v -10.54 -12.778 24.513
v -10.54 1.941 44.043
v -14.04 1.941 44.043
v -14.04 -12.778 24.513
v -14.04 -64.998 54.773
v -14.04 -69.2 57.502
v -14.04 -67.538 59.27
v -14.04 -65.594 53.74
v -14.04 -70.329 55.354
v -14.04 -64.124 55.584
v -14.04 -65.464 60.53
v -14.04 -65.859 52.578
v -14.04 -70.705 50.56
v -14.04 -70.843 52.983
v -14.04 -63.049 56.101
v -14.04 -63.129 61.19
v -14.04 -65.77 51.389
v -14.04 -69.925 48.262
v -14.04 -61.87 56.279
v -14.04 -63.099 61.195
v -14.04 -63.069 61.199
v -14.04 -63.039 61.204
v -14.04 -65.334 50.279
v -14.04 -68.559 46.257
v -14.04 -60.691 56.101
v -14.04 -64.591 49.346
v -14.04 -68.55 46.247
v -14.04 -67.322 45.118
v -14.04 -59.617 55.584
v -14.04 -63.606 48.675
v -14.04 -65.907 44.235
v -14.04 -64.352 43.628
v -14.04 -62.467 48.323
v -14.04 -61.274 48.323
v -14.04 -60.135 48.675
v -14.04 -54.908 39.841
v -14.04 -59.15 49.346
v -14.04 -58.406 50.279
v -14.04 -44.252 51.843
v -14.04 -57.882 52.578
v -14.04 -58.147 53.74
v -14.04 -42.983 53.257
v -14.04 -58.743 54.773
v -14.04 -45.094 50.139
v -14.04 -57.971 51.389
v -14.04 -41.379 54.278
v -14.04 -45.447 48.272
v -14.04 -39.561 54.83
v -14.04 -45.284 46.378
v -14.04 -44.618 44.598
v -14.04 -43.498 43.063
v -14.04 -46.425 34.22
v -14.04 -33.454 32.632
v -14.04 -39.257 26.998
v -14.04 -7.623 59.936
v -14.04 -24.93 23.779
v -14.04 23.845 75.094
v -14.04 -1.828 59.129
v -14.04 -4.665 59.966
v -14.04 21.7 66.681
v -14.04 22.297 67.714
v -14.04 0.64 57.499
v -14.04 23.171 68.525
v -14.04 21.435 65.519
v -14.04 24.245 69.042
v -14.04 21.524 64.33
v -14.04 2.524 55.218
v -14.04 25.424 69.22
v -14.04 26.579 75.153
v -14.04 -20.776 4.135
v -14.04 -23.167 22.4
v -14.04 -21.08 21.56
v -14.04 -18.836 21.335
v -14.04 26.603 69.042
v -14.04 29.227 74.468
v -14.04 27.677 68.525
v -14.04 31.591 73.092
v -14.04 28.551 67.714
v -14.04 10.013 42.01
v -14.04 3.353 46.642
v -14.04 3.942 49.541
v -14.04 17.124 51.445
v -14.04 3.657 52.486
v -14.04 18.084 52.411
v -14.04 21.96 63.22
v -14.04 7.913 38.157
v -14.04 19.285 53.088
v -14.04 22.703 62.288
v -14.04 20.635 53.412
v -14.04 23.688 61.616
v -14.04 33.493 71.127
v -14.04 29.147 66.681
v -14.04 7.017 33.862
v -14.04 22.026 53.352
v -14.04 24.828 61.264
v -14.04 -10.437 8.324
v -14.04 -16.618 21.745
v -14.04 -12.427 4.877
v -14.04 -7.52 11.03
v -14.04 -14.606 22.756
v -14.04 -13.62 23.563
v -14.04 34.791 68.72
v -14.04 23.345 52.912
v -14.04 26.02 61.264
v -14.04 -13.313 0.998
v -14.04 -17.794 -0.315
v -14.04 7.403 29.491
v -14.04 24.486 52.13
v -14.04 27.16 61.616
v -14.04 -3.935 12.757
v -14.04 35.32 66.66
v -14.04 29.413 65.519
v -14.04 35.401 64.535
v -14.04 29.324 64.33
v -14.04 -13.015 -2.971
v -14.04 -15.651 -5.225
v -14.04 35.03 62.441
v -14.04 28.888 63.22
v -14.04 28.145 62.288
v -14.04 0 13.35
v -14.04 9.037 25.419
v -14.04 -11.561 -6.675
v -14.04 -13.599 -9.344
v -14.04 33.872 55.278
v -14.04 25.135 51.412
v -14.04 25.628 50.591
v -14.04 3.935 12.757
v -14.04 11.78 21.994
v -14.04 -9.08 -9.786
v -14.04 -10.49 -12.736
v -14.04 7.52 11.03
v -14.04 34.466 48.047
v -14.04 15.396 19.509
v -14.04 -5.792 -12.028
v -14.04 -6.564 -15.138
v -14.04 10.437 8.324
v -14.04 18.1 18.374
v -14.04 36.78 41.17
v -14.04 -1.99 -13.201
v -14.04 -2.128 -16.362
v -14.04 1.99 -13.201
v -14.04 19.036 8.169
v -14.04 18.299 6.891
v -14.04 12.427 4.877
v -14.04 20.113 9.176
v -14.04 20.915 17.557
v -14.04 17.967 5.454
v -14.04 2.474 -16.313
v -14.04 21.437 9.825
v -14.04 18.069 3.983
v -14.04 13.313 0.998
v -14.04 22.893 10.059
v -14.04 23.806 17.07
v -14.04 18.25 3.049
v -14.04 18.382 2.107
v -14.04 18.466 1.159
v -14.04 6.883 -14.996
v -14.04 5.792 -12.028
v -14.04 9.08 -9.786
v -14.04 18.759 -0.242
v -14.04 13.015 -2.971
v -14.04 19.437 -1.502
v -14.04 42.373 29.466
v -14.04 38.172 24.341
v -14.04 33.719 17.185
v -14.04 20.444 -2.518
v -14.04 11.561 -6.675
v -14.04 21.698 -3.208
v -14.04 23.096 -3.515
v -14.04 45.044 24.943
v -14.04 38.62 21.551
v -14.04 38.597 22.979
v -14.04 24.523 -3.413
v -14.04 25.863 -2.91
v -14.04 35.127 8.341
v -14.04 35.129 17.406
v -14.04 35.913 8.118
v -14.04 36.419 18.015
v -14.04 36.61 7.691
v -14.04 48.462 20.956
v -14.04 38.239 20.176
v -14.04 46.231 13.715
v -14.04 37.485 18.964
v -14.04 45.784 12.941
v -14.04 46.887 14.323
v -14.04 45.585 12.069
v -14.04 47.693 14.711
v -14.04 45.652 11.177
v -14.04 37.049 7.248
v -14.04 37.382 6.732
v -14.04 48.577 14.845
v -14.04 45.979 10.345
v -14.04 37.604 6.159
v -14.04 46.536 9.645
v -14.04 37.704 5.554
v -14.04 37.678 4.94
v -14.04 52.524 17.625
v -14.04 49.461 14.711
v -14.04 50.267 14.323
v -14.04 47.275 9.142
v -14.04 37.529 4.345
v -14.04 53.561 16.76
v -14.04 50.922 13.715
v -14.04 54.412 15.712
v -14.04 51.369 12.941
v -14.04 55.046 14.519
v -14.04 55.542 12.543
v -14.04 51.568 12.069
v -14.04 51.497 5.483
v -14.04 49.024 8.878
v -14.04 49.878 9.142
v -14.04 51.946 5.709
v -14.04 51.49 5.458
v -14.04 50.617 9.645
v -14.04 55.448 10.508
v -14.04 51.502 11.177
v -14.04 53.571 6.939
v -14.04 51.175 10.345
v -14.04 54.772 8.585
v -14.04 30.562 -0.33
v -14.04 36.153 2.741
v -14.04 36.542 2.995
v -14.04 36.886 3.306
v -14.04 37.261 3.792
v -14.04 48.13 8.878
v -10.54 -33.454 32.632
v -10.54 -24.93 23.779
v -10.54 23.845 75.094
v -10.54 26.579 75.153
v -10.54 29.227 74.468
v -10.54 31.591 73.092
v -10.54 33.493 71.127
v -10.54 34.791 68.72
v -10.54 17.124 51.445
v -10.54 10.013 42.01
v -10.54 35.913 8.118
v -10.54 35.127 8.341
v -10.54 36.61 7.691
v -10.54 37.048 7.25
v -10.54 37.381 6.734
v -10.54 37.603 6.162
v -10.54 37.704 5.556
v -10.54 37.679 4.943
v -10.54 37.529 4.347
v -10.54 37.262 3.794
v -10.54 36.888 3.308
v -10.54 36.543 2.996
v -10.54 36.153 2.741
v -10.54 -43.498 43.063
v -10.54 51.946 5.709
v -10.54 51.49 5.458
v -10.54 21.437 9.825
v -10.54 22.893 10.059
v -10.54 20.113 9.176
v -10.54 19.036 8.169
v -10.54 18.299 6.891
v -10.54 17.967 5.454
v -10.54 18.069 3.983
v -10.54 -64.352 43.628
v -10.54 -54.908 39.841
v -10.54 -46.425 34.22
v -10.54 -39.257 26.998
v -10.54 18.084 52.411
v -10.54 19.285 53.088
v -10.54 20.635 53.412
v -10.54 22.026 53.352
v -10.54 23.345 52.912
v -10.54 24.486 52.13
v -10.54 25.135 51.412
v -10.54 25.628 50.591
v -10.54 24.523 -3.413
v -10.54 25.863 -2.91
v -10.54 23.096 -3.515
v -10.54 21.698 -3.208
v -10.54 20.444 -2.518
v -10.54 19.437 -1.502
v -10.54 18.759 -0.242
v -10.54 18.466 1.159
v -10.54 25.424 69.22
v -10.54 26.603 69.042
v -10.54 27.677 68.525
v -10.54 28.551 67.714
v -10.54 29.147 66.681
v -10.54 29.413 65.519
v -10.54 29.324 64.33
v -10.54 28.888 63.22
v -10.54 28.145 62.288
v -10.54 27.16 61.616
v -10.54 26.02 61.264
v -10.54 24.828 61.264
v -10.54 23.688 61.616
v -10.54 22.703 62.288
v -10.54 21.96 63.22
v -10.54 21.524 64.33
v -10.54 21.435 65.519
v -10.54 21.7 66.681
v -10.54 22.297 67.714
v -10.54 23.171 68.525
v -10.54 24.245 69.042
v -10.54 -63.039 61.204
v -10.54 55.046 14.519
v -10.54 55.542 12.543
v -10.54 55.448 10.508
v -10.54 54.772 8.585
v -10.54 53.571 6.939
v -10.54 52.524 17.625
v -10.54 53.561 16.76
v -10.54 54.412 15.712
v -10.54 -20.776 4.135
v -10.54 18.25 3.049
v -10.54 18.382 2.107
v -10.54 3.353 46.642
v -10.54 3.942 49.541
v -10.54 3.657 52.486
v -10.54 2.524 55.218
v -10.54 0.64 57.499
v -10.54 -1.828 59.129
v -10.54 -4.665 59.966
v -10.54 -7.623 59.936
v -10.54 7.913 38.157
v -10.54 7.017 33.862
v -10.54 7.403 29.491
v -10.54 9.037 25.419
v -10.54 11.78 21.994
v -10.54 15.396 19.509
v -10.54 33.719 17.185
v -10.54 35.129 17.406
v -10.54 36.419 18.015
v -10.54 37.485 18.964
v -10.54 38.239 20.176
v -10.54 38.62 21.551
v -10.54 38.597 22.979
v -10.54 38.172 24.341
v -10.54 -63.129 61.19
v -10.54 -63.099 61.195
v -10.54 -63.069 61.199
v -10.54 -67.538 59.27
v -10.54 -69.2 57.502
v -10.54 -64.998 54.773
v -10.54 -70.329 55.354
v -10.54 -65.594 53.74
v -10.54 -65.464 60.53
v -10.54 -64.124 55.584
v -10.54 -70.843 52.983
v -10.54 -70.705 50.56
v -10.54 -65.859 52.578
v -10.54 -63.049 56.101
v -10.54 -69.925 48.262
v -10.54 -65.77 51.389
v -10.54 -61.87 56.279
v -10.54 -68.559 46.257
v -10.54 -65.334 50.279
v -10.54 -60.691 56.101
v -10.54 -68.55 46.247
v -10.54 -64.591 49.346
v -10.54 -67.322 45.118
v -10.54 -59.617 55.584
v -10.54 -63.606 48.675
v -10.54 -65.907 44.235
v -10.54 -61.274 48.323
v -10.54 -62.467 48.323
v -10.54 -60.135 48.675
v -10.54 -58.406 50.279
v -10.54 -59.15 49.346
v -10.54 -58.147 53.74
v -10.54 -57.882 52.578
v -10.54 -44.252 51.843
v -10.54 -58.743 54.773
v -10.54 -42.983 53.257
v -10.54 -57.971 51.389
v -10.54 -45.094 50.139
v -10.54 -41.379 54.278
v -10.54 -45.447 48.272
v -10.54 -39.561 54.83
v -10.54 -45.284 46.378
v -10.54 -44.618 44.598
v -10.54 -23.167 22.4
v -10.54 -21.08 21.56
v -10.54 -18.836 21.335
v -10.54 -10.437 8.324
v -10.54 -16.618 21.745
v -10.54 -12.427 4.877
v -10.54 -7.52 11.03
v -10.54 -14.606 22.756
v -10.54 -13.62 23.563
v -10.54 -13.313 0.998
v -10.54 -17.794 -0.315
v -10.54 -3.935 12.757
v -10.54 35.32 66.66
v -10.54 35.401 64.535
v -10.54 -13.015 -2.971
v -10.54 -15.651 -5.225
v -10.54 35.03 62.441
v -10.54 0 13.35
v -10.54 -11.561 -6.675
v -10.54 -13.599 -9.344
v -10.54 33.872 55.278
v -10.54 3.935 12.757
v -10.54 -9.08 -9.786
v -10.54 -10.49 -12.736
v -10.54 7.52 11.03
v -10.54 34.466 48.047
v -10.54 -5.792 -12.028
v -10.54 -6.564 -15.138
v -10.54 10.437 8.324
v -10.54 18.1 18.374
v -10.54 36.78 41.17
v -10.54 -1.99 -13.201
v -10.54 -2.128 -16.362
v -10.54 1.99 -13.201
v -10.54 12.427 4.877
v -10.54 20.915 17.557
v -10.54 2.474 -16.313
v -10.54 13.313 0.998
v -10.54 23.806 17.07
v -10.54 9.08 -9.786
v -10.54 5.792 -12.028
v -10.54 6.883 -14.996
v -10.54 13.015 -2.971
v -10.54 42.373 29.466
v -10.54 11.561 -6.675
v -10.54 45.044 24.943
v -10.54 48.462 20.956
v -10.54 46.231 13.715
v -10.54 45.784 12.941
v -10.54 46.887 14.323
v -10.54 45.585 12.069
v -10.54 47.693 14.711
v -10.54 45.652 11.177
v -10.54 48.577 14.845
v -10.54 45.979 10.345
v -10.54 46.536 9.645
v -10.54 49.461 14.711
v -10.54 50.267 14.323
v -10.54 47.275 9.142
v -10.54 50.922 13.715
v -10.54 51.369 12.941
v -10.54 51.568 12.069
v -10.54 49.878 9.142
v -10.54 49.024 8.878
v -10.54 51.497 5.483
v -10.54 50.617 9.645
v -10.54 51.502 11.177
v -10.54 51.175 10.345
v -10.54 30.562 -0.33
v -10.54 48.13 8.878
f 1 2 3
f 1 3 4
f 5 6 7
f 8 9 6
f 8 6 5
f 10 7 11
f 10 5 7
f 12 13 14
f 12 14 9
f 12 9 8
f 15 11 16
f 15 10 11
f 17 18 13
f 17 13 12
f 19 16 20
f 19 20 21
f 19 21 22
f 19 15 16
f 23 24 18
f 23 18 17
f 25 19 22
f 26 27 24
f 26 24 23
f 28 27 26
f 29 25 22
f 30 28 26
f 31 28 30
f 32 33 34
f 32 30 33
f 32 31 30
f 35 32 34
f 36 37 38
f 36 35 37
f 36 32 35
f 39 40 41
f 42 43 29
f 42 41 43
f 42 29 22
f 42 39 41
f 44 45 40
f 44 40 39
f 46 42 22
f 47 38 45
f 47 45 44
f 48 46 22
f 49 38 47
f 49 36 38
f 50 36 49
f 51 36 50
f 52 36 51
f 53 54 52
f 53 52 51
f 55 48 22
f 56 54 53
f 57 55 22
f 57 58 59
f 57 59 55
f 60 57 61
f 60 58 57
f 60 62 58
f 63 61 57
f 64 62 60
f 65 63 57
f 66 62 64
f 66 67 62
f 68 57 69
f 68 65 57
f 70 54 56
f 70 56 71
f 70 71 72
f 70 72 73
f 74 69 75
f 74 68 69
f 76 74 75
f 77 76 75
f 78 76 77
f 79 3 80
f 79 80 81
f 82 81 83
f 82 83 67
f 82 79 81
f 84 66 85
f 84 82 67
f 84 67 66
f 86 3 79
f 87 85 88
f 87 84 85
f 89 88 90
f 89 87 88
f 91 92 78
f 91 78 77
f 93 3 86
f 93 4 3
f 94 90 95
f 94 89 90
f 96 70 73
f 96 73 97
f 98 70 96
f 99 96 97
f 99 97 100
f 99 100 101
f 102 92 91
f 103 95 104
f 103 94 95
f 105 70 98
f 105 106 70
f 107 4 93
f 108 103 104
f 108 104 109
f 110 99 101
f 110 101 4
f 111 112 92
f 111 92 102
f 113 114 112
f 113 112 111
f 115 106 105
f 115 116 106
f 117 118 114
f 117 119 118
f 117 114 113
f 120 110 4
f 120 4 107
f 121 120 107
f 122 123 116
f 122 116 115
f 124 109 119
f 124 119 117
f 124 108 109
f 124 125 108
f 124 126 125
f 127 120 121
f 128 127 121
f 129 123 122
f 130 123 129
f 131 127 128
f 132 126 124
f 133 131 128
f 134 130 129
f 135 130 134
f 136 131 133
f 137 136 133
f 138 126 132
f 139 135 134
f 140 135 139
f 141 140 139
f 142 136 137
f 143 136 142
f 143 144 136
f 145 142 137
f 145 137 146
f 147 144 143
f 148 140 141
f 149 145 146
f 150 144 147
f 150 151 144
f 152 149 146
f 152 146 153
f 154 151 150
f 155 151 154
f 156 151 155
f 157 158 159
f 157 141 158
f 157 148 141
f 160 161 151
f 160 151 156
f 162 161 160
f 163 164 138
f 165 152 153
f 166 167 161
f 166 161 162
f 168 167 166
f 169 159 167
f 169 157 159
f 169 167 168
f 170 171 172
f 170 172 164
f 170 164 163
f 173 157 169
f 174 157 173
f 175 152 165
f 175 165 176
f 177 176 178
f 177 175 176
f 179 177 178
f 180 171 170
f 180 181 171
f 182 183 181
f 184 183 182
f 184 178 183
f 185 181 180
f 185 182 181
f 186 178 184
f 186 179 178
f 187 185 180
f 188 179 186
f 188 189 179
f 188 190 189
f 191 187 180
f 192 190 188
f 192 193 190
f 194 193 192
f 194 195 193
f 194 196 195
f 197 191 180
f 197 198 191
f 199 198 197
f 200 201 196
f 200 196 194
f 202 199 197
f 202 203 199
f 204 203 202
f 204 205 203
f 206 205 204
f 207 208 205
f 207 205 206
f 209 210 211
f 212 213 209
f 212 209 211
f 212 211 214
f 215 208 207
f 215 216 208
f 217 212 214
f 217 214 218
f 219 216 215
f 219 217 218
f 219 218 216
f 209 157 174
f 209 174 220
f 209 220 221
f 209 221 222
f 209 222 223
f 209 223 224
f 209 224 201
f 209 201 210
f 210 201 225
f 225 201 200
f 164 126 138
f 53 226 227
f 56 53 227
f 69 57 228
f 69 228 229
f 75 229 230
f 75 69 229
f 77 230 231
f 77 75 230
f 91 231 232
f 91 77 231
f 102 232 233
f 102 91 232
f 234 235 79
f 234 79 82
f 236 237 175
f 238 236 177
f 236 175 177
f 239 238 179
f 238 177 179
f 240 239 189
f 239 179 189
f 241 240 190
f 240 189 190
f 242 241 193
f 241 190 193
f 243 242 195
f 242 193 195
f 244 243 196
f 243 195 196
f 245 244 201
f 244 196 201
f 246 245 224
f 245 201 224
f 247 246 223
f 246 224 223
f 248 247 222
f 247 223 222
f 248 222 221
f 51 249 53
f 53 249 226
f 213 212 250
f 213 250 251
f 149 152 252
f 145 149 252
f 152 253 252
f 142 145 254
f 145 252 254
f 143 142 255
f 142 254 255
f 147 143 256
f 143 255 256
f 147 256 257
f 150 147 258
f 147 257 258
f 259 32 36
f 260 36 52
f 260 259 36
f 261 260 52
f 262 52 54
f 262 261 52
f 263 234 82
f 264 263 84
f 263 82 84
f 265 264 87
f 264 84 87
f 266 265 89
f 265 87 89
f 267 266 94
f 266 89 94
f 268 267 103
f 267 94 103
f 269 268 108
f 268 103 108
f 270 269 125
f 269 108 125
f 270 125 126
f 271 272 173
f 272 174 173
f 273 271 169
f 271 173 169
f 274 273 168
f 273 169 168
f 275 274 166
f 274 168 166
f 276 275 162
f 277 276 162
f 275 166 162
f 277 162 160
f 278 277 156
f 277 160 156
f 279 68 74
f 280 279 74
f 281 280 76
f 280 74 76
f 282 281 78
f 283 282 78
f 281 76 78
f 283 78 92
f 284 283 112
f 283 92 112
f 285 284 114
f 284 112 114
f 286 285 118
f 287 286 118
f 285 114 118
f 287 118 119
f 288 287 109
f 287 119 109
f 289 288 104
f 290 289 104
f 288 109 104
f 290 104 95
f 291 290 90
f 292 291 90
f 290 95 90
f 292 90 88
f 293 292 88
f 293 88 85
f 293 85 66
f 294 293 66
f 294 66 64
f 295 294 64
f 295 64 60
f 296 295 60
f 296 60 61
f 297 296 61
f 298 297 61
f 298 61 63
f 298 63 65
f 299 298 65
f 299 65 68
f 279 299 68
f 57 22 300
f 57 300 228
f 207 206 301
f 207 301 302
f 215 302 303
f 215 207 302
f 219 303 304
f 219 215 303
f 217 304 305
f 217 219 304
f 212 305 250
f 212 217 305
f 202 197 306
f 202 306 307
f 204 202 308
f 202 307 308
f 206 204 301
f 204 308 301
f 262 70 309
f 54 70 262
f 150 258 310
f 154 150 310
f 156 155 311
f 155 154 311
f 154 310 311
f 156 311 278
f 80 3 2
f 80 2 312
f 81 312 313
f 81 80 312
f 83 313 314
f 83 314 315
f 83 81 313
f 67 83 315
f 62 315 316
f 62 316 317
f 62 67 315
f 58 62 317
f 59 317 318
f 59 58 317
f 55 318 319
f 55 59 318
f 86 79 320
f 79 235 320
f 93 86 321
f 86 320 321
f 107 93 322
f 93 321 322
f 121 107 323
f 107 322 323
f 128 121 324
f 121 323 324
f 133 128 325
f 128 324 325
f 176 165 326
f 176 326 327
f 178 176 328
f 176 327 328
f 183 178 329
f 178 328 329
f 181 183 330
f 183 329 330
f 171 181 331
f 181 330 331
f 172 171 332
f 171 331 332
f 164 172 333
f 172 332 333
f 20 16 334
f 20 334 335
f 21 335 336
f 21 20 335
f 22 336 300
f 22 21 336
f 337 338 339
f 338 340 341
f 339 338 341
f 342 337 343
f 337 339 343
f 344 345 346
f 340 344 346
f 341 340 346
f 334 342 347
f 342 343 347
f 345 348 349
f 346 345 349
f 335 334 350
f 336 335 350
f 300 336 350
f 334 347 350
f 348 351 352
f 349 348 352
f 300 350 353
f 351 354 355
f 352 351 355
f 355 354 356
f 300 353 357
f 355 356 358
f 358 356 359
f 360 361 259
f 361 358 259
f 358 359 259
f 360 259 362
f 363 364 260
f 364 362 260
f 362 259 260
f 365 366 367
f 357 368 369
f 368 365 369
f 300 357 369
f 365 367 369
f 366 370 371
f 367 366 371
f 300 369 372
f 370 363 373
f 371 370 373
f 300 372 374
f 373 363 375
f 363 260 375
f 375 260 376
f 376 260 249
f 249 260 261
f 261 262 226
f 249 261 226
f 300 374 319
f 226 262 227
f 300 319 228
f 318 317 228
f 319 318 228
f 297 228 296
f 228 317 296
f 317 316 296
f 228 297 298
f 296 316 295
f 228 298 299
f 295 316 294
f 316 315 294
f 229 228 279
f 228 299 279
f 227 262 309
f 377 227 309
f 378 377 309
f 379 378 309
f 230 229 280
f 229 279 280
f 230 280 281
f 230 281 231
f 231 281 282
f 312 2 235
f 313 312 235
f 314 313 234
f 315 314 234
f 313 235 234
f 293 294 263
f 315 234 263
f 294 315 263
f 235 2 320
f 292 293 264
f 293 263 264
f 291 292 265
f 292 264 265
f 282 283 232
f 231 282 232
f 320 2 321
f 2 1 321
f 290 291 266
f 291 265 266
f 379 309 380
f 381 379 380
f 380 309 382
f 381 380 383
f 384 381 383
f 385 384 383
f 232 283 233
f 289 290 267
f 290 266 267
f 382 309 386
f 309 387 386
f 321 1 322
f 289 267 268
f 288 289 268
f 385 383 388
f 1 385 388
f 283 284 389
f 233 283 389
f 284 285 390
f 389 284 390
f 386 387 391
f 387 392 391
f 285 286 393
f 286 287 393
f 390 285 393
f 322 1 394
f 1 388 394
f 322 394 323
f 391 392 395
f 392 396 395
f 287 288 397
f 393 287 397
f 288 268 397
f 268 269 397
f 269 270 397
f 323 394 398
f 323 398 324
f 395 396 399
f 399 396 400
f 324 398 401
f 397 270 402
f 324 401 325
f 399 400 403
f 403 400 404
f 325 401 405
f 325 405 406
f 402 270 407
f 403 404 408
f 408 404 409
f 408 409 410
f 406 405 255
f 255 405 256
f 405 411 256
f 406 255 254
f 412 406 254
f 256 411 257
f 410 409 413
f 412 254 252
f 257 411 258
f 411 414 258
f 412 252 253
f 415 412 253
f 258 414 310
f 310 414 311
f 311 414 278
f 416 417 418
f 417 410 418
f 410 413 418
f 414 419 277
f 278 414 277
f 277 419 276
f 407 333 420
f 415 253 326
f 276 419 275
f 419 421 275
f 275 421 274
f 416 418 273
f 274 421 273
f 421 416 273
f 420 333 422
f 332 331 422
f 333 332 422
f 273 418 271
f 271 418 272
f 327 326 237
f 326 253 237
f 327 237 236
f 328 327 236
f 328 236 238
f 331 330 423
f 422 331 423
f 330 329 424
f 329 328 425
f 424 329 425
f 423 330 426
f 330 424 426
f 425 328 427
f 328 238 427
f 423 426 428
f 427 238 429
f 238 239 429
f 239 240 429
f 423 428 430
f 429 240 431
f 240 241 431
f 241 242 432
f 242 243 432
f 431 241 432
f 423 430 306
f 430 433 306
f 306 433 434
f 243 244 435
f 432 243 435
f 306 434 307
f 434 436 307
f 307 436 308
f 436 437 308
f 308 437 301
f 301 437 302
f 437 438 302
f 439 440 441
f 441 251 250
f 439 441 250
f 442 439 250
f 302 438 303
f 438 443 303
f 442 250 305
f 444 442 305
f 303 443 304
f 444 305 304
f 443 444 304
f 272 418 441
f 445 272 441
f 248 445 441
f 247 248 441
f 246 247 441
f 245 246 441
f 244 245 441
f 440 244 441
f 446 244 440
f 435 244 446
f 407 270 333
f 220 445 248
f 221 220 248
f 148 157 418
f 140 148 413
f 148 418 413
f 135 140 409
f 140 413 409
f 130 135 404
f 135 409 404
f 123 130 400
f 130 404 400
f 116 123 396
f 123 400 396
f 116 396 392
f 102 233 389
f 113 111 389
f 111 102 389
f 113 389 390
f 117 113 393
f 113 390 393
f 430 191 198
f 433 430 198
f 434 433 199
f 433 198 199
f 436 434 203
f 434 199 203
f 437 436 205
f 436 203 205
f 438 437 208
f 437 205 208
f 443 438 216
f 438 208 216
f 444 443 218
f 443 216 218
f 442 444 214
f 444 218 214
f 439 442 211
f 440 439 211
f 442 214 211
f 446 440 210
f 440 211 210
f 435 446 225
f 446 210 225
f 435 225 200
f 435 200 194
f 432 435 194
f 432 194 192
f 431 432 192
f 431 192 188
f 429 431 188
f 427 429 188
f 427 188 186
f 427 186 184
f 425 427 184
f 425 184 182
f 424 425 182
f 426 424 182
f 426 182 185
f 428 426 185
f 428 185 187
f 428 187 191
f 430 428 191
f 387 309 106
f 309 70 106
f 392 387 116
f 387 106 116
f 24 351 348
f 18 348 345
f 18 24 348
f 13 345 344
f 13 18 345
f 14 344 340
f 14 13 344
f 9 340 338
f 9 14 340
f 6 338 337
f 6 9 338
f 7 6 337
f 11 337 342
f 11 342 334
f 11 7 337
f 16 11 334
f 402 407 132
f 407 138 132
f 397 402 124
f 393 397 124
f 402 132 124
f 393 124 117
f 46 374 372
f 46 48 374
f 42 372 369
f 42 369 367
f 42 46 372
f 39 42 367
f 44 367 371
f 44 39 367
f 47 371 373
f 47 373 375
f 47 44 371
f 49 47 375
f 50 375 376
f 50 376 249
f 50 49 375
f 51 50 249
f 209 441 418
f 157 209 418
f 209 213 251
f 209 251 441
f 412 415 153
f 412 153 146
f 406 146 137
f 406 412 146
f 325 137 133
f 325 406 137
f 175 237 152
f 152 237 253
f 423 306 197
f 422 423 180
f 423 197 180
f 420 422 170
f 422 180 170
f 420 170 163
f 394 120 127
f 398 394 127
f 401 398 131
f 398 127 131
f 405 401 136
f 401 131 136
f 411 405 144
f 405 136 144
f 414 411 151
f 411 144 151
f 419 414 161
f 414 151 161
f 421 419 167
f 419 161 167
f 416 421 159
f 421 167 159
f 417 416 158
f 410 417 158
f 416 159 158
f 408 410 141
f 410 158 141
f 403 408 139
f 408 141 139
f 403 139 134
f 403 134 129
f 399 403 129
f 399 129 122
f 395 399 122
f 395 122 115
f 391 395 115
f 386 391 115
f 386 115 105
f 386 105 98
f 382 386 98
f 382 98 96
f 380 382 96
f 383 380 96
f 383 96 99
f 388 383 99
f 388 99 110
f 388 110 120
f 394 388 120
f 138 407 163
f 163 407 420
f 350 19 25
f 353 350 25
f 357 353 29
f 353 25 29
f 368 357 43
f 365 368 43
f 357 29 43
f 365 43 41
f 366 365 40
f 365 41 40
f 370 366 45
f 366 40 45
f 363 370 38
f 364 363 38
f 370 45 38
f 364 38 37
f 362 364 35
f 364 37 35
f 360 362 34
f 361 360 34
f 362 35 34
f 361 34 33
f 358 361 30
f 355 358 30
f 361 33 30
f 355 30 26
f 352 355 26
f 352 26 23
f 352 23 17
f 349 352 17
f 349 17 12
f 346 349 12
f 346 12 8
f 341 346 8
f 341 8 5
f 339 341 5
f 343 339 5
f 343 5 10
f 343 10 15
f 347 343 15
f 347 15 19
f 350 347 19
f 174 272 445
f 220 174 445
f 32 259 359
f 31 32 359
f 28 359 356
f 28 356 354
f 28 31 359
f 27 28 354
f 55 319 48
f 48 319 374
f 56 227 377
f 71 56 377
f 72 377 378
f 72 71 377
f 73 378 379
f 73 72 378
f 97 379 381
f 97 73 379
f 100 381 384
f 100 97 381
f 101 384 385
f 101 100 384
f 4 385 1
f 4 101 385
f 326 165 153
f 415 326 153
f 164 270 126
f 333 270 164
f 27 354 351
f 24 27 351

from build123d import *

# Parameters (mm, degrees)
SZKIC7_W                    = 139.266717109
SZKIC7_H                    = 160.929145335
DODANIE_WYCI_GNI_CIE2_DEPTH = 3.5
SZKIC8_R                    = 13.35
SZKIC8_R_2                  = 3
SZKIC8_R_3                  = 4
WYTNIJ_WYCI_GNI_CIE4_DEPTH  = 129.67294198
SZKIC9_W                    = 153.512733411
SZKIC9_H                    = 228.238191402
WYTNIJ_WYCI_GNI_CIE5_DEPTH  = 129.67294198
WYTNIJ_WYCI_GNI_CIE14_DEPTH = 104.40635377
WYTNIJ_WYCI_GNI_CIE15_DEPTH = 104.40635377
ZAOKR_GLENIE11_R            = 30
DODANIE_WYCI_GNI_CIE5_DEPTH = 3.5
ZAOKR_GLENIE14_R            = 5
WYTNIJ_WYCI_GNI_CIE17_DEPTH = 104.40635377
DODANIE_WYCI_GNI_CIE6_DEPTH = 3.5
ZAOKR_GLENIE24_R            = 5
DODANIE_WYCI_GNI_CIE7_DEPTH = 3.5
WYTNIJ_WYCI_GNI_CIE19_START = -10
WYTNIJ_WYCI_GNI_CIE19_DEPTH = 10
ZAOKR_GLENIE45_R            = 50
ZAOKR_GLENIE46_R            = 5
ZAOKR_GLENIE49_R            = 7
DODANIE_WYCI_GNI_CIE8_DEPTH = 3.5
ZAOKR_GLENIE61_R            = 3
ZAOKR_GLENIE62_R            = 5
WYTNIJ_WYCI_GNI_CIE21_DEPTH = 104.40635377
ZAOKR_GLENIE69_R            = 30
ZAOKR_GLENIE72_R            = 10
ZAOKR_GLENIE75_R            = 5
ZAOKR_GLENIE76_R            = 8
ZAOKR_GLENIE77_R            = 15


with BuildPart() as part:
    # Szkic7 → Dodanie-wyciągnięcie2 (new body)
    with BuildSketch(Plane(origin=(-10.54007835, 1.1e-07, -2.52e-07), x_dir=(-2.3878901828089376e-08, 0, 0.9999999999999998), z_dir=(-0.9999999999999998, 1.0404070824565065e-08, -2.387890182808938e-08))):
        with Locations((21.253283054, -10.552427612)):
            Rectangle(SZKIC7_W, SZKIC7_H)
    extrude(amount=DODANIE_WYCI_GNI_CIE2_DEPTH)

    # Szkic8 → Wytnij-wyciągnięcie4 (cut, through all)
    with BuildSketch(Plane(origin=(-14.04007835, 1.46e-07, -3.35e-07), x_dir=(-2.3878901828089376e-08, 0, 0.9999999999999998), z_dir=(-0.9999999999999998, 1.0404070821366677e-08, -2.387890182808938e-08))):
        Circle(SZKIC8_R)
        with Locations((11.844583319, 48.576803579)):
            Circle(SZKIC8_R_2)
        with Locations((65.219786586, 25.423993346)):
            Circle(SZKIC8_R_3)
        with Locations((52.278664472, -61.870358339)):
            Circle(SZKIC8_R_3)
    extrude(amount=-WYTNIJ_WYCI_GNI_CIE4_DEPTH, mode=Mode.SUBTRACT)

    # Szkic9 → Wytnij-wyciągnięcie5 (cut, through all)
    with BuildSketch(Plane(origin=(-14.04007835, 1.46e-07, -3.35e-07), x_dir=(-2.3878901828089376e-08, 0, 0.9999999999999998), z_dir=(-0.9999999999999998, 1.04040708213667e-08, -2.387890182808938e-08))):
        with Locations((22.662126008, 15.447874068)):
            Rectangle(SZKIC9_W, SZKIC9_H)
        with BuildLine():
            Line((-13.382127281, -14.863333052), (46.256707196, -68.558858213))
            ThreePointArc((46.256707196, -68.558858213), (55.372975766, -70.321703653), (61.195751969, -63.089189983))
            Line((61.195751969, -63.089189983), (75.094385693, 23.845293729))
            ThreePointArc((75.094385693, 23.845293729), (73.861369629, 30.456193909), (68.720255549, 34.79131511))
            Line((68.720255549, 34.79131511), (14.519431503, 55.045589184))
            ThreePointArc((14.519431503, 55.045589184), (9.521665371, 55.180140024), (5.708860939, 51.946211669))
            Line((5.708860939, 51.946211669), (-17.530635372, 9.626880256))
            ThreePointArc((-17.530635372, 9.626880256), (-19.719086203, -3.340305273), (-13.382127281, -14.863333052))
        make_face(mode=Mode.SUBTRACT)
    extrude(amount=-WYTNIJ_WYCI_GNI_CIE5_DEPTH, mode=Mode.SUBTRACT)

    # Szkic14 → Wytnij-wyciągnięcie14 (cut, through all)
    with BuildSketch(Plane(origin=(-10.54007835, 1.1e-07, -2.52e-07), x_dir=(2.3878901828089376e-08, 0, -0.9999999999999998), z_dir=(0.9999999999999998, -1.0404070821258326e-08, 2.387890182808938e-08))):
        with BuildLine():
            Line((-64.084108782, 18.320448812), (-52.714951988, -52.792424274))
            Line((-52.714951988, -52.792424274), (-32.631950605, -33.45407936))
            Line((-32.631950605, -33.45407936), (-18.993828244, -20.321644163))
            Line((-18.993828244, -20.321644163), (-23.497433394, -7.529972113))
            ThreePointArc((-23.497433394, -7.529972113), (-20.22176145, 0.243476392), (-16.722321984, 7.918790833))
            ThreePointArc((-16.722321984, 7.918790833), (-6.217208555, 17.426692703), (7.933812077, 16.715200469))
            Line((7.933812077, 16.715200469), (0.329933976, 30.561930754))
            Line((0.329933976, 30.561930754), (-5.626615834, 41.408861433))
            Line((-5.626615834, 41.408861433), (-64.084108782, 18.320448812))
        make_face()
    extrude(amount=-WYTNIJ_WYCI_GNI_CIE14_DEPTH, mode=Mode.SUBTRACT)

    # Szkic18 → Wytnij-wyciągnięcie15 (cut, through all)
    with BuildSketch(Plane(origin=(-10.54007835, 1.1e-07, -2.52e-07), x_dir=(2.3878901833219947e-08, 0, -0.9999999999999997), z_dir=(0.9999999999999997, -1.0404070824107121e-08, 2.3878901833219954e-08))):
        with BuildLine():
            Line((-56.144678545, 29.624280722), (-18.759552018, 47.489049981))
            ThreePointArc((-18.759552018, 47.489049981), (-17.902798902, 52.083657433), (-14.345263169, 55.114892007))
            Line((-14.345263169, 55.114892007), (-18.275031936, 65.389368248))
            Line((-18.275031936, 65.389368248), (-73.458270167, 44.282952603))
            Line((-73.458270167, 44.282952603), (-68.840695847, 34.74542114))
            ThreePointArc((-68.840695847, 34.74542114), (-61.478985752, 34.697957391), (-56.144678545, 29.624280722))
        make_face()
    extrude(amount=-WYTNIJ_WYCI_GNI_CIE15_DEPTH, mode=Mode.SUBTRACT)

    # Zaokrąglenie11
    zaokr_glenie11_edges = [part.edges().sort_by_distance(p)[0] for p in [
        (-12.290078304, 47.489050108, 18.759551724),
        (-12.290079383, 29.62428085, 56.144678252),
    ]]
    fillet(zaokr_glenie11_edges, radius=ZAOKR_GLENIE11_R)

    # Szkic19 → Dodanie-wyciągnięcie5 (add)
    with BuildSketch(Plane(origin=(-10.54007835, 1.1e-07, -2.52e-07), x_dir=(2.3878901833219947e-08, 0, -0.9999999999999997), z_dir=(0.9999999999999997, -1.0404070824107115e-08, 2.3878901833219954e-08))):
        Polygon((-58.946047974, 22.777610248), (-66.322773152, 19.747008618), (-66.720640825, 19.033728733), (-20.22726344, -16.008684341), (-16.035438929, -9.564443008), align=None)
    extrude(amount=-DODANIE_WYCI_GNI_CIE5_DEPTH)

    # Zaokrąglenie14
    zaokr_glenie14_edges = [part.edges().sort_by_distance(p)[0] for p in [
        (-12.290077987, 16.715200597, -7.93381237),
    ]]
    fillet(zaokr_glenie14_edges, radius=ZAOKR_GLENIE14_R)

    # Szkic21 → Wytnij-wyciągnięcie17 (cut, through all)
    with BuildSketch(Plane(origin=(-10.54007835, 1.1e-07, -2.52e-07), x_dir=(2.3878901833219947e-08, 0, -0.9999999999999997), z_dir=(0.9999999999999997, -1.0404070824107095e-08, 2.3878901833219954e-08))):
        with BuildLine():
            Line((-57.747304238, 22.208602164), (-14.808308197, 42.727330539))
            ThreePointArc((-14.808308197, 42.727330539), (-10.724979425, 42.115651428), (-7.085527385, 44.065552465))
            Line((-7.085527385, 44.065552465), (-5.626615834, 41.408861433))
            Line((-5.626615834, 41.408861433), (-56.83244455, 21.184571229))
            Line((-56.83244455, 21.184571229), (-58.018162719, 22.09497171))
            Line((-58.018162719, 22.09497171), (-57.747304238, 22.208602164))
        make_face()
    extrude(amount=-WYTNIJ_WYCI_GNI_CIE17_DEPTH, mode=Mode.SUBTRACT)

    # Szkic22 → Dodanie-wyciągnięcie6 (add)
    with BuildSketch(Plane(origin=(-14.04007835, 1.46e-07, -3.35e-07), x_dir=(-2.3878901833219947e-08, 0, 0.9999999999999997), z_dir=(-0.9999999999999997, 1.0404070824107088e-08, -2.3878901833219954e-08))):
        Polygon((17.312164793, 44.627828311), (16.881727623, 7.573016126), (9.920276091, 10.932172716), (10.31169253, 44.627828311), align=None)
    extrude(amount=-DODANIE_WYCI_GNI_CIE6_DEPTH)

    # Zaokrąglenie24
    zaokr_glenie24_edges = [part.edges().sort_by_distance(p)[0] for p in [
        (-12.290078426, 15.583851379, 9.974310759),
    ]]
    fillet(zaokr_glenie24_edges, radius=ZAOKR_GLENIE24_R)

    # Szkic24 → Dodanie-wyciągnięcie7 (add)
    with BuildSketch(Plane(origin=(-10.54007835, 1.1e-07, -2.52e-07), x_dir=(2.3878901833219947e-08, 0, -0.9999999999999997), z_dir=(0.9999999999999997, -1.0404070824107058e-08, 2.3878901833219954e-08))):
        with BuildLine():
            Line((-36.816395524, 1.75323141), (-22.747516876, -7.1896775))
            Line((-22.747516876, -7.1896775), (-16.897223685, -9.883462439))
            Line((-16.897223685, -9.883462439), (-13.267833736, 11.506726098))
            Line((-13.267833736, 11.506726098), (-17.070297429, 23.806323206))
            ThreePointArc((-17.070297429, 23.806323206), (-23.405276733, 9.611828212), (-36.816395524, 1.75323141))
        make_face()
    extrude(amount=-DODANIE_WYCI_GNI_CIE7_DEPTH)

    # Szkic15 → Wytnij-wyciągnięcie19 (cut)
    with BuildSketch(Plane(origin=(-10.54007835, 1.1e-07, -2.52e-07), x_dir=(2.3878901833219947e-08, 0, -0.9999999999999997), z_dir=(0.9999999999999997, -1.040407082410717e-08, 2.3878901833219954e-08)).offset(WYTNIJ_WYCI_GNI_CIE19_START)):
        with BuildLine():
            Line((-46.247351401, -68.55043477), (13.382127281, -14.863333052))
            ThreePointArc((13.382127281, -14.863333052), (5.78541375, -19.144946794), (-2.911139806, -19.786997373))
            Line((-2.911139806, -19.786997373), (-46.469923975, -54.995874079))
            ThreePointArc((-46.469923975, -54.995874079), (-43.279874823, -61.722599619), (-46.247351401, -68.55043477))
        make_face()
    extrude(amount=WYTNIJ_WYCI_GNI_CIE19_DEPTH, mode=Mode.SUBTRACT)

    # Zaokrąglenie45
    zaokr_glenie45_edges = [part.edges().sort_by_distance(p)[0] for p in [
        (-12.290080032, -54.995873951, 46.469923682),
    ]]
    fillet(zaokr_glenie45_edges, radius=ZAOKR_GLENIE45_R)

    # Zaokrąglenie46
    # the kernel refuses this fillet: 5 mm, written as the material it adds along each edge
    with BuildSketch(Plane(origin=(-14.040080468, -63.089189837, 61.195751634), x_dir=(-7.0180139349827484e-09, -0.9904804440406619, -0.13765351420509783), z_dir=(0.9999999999999997, -1.04040708213667e-08, 2.3878901828089376e-08))) as zaokr_glenie46_piece_1:
        with BuildLine():
            CenterArc((0.051723223, -4.999987357), ZAOKR_GLENIE46_R, 90.128848909, 1.042345949)
            Line((-0.050475691, -0.001031928), (0, 0))
            ThreePointArc((0, 0), (0.020239522, -2.2758e-05), (0.040479044, 0))
        make_face()
    extrude(amount=3.5)

    # Zaokrąglenie49
    zaokr_glenie49_edges = [part.edges().sort_by_distance(p)[0] for p in [
        (-12.290080158, -52.792424146, 52.714951695),
    ]]
    fillet(zaokr_glenie49_edges, radius=ZAOKR_GLENIE49_R)

    # Szkic26 → Dodanie-wyciągnięcie8 (add)
    with BuildSketch(Plane(origin=(-10.54007835, 1.1e-07, -2.52e-07), x_dir=(2.3878901833219947e-08, 0, -0.9999999999999997), z_dir=(0.9999999999999997, -1.0404070824107146e-08, 2.3878901833219954e-08))):
        Polygon((-7.085527385, 44.065552465), (-10.059220211, 22.893380097), (-14.304391944, 31.138416493), (-12.581544758, 43.40478687), align=None)
    extrude(amount=-DODANIE_WYCI_GNI_CIE8_DEPTH)

    # Zaokrąglenie61
    zaokr_glenie61_edges = [part.edges().sort_by_distance(p)[0] for p in [
        (-12.290078061, 44.065552593, 7.085527092),
    ]]
    fillet(zaokr_glenie61_edges, radius=ZAOKR_GLENIE61_R)

    # Zaokrąglenie62
    zaokr_glenie62_edges = [part.edges().sort_by_distance(p)[0] for p in [
        (-12.290078331, 41.547939767, 17.276387809),
    ]]
    fillet(zaokr_glenie62_edges, radius=ZAOKR_GLENIE62_R)

    # Szkic28 → Wytnij-wyciągnięcie21 (cut, through all)
    with BuildSketch(Plane(origin=(-10.54007835, 1.1e-07, -2.52e-07), x_dir=(2.3878901833219947e-08, 0, -0.9999999999999997), z_dir=(0.9999999999999997, -1.0404070824107156e-08, 2.3878901833219954e-08))):
        with BuildLine():
            Line((-5.482778627, 51.496981839), (14.995682487, 6.883277326))
            ThreePointArc((14.995682487, 6.883277326), (14.189845026, -8.420112715), (1.143833134, -16.460305154))
            Line((1.143833134, -16.460305154), (-2.911139806, -19.786997373))
            ThreePointArc((-2.911139806, -19.786997373), (16.423351118, -11.413743385), (17.530635372, 9.626880256))
            Line((17.530635372, 9.626880256), (-5.458225211, 51.489801759))
            Line((-5.458225211, 51.489801759), (-5.482778627, 51.496981839))
        make_face()
    extrude(amount=-WYTNIJ_WYCI_GNI_CIE21_DEPTH, mode=Mode.SUBTRACT)

    # Zaokrąglenie69
    zaokr_glenie69_edges = [part.edges().sort_by_distance(p)[0] for p in [
        (-12.290078494, -16.460305026, -1.143833428),
    ]]
    fillet(zaokr_glenie69_edges, radius=ZAOKR_GLENIE69_R)

    # Zaokrąglenie72
    # the kernel refuses this fillet: 10 mm, written as the material it adds along each edge
    with BuildSketch(Plane(origin=(-10.540079015, -20.321644054, 18.993827992), x_dir=(-2.4417350092824874e-08, -0.6936260242852466, 0.7203352958409311), z_dir=(-0.9999999999999998, 1.0404070821258326e-08, -2.387890182808938e-08))) as zaokr_glenie72_piece_1:
        with BuildLine():
            CenterArc((6.286783652, 10), ZAOKR_GLENIE72_R, 213.765114836, 56.234885164)
            Line((-2.026446567, 4.442104416), (-2.192711171, 4.330946504))
            ThreePointArc((-2.192711171, 4.330946504), (-1.195183636, 2.138043594), (-0.181960353, -0.083008614))
            Line((-0.181960353, -0.083008614), (0, -0.2))
            Line((0, -0.2), (6.286783652, -0.2))
            Line((6.286783652, -0.2), (6.286783652, 0))
        make_face()
    extrude(amount=3.5)
    with BuildSketch(Plane(origin=(-14.0400797, 16.872020607, 63.852541245), x_dir=(-6.503841534045875e-09, -0.9874599106733049, -0.1578699617187155), z_dir=(0.9999999999999997, -1.0404070828894181e-08, 2.38789018268686e-08))) as zaokr_glenie72_piece_2:
        with BuildLine():
            CenterArc((ZAOKR_GLENIE72_R * 2.4806255413, ZAOKR_GLENIE72_R), ZAOKR_GLENIE72_R, 133.911105356, 136.088894644)
            Line((ZAOKR_GLENIE72_R * 1.78708406522, ZAOKR_GLENIE72_R * 1.72041669952), (ZAOKR_GLENIE72_R * 1.7732132357, ZAOKR_GLENIE72_R * 1.73482503351))
            Line((ZAOKR_GLENIE72_R * 1.7732132357, ZAOKR_GLENIE72_R * 1.73482503351), (-ZAOKR_GLENIE72_R * 0.0138708295217, ZAOKR_GLENIE72_R * 0.0144083339905))
            Line((-ZAOKR_GLENIE72_R * 0.0138708295217, ZAOKR_GLENIE72_R * 0.0144083339905), (0, -ZAOKR_GLENIE72_R * 0.02))
            Line((0, -ZAOKR_GLENIE72_R * 0.02), (ZAOKR_GLENIE72_R * 2.4806255413, -ZAOKR_GLENIE72_R * 0.02))
            Line((ZAOKR_GLENIE72_R * 2.4806255413, -ZAOKR_GLENIE72_R * 0.02), (ZAOKR_GLENIE72_R * 2.4806255413, 0))
        make_face()
    extrude(amount=3.5)

    # Zaokrąglenie75
    zaokr_glenie75_edges = [part.edges().sort_by_distance(p)[0] for p in [
        (-12.290079506, 22.094971838, 58.018162426),
    ]]
    fillet(zaokr_glenie75_edges, radius=ZAOKR_GLENIE75_R)

    # Zaokrąglenie76
    zaokr_glenie76_edges = [part.edges().sort_by_distance(p)[0] for p in [
        (-12.290079006, -15.716243361, 20.615266189),
    ]]
    fillet(zaokr_glenie76_edges, radius=ZAOKR_GLENIE76_R)

    # Zaokrąglenie77
    zaokr_glenie77_edges = [part.edges().sort_by_distance(p)[0] for p in [
        (-12.290079101, 3.02881083, 32.74384556),
    ]]
    fillet(zaokr_glenie77_edges, radius=ZAOKR_GLENIE77_R)


solid = part.part
